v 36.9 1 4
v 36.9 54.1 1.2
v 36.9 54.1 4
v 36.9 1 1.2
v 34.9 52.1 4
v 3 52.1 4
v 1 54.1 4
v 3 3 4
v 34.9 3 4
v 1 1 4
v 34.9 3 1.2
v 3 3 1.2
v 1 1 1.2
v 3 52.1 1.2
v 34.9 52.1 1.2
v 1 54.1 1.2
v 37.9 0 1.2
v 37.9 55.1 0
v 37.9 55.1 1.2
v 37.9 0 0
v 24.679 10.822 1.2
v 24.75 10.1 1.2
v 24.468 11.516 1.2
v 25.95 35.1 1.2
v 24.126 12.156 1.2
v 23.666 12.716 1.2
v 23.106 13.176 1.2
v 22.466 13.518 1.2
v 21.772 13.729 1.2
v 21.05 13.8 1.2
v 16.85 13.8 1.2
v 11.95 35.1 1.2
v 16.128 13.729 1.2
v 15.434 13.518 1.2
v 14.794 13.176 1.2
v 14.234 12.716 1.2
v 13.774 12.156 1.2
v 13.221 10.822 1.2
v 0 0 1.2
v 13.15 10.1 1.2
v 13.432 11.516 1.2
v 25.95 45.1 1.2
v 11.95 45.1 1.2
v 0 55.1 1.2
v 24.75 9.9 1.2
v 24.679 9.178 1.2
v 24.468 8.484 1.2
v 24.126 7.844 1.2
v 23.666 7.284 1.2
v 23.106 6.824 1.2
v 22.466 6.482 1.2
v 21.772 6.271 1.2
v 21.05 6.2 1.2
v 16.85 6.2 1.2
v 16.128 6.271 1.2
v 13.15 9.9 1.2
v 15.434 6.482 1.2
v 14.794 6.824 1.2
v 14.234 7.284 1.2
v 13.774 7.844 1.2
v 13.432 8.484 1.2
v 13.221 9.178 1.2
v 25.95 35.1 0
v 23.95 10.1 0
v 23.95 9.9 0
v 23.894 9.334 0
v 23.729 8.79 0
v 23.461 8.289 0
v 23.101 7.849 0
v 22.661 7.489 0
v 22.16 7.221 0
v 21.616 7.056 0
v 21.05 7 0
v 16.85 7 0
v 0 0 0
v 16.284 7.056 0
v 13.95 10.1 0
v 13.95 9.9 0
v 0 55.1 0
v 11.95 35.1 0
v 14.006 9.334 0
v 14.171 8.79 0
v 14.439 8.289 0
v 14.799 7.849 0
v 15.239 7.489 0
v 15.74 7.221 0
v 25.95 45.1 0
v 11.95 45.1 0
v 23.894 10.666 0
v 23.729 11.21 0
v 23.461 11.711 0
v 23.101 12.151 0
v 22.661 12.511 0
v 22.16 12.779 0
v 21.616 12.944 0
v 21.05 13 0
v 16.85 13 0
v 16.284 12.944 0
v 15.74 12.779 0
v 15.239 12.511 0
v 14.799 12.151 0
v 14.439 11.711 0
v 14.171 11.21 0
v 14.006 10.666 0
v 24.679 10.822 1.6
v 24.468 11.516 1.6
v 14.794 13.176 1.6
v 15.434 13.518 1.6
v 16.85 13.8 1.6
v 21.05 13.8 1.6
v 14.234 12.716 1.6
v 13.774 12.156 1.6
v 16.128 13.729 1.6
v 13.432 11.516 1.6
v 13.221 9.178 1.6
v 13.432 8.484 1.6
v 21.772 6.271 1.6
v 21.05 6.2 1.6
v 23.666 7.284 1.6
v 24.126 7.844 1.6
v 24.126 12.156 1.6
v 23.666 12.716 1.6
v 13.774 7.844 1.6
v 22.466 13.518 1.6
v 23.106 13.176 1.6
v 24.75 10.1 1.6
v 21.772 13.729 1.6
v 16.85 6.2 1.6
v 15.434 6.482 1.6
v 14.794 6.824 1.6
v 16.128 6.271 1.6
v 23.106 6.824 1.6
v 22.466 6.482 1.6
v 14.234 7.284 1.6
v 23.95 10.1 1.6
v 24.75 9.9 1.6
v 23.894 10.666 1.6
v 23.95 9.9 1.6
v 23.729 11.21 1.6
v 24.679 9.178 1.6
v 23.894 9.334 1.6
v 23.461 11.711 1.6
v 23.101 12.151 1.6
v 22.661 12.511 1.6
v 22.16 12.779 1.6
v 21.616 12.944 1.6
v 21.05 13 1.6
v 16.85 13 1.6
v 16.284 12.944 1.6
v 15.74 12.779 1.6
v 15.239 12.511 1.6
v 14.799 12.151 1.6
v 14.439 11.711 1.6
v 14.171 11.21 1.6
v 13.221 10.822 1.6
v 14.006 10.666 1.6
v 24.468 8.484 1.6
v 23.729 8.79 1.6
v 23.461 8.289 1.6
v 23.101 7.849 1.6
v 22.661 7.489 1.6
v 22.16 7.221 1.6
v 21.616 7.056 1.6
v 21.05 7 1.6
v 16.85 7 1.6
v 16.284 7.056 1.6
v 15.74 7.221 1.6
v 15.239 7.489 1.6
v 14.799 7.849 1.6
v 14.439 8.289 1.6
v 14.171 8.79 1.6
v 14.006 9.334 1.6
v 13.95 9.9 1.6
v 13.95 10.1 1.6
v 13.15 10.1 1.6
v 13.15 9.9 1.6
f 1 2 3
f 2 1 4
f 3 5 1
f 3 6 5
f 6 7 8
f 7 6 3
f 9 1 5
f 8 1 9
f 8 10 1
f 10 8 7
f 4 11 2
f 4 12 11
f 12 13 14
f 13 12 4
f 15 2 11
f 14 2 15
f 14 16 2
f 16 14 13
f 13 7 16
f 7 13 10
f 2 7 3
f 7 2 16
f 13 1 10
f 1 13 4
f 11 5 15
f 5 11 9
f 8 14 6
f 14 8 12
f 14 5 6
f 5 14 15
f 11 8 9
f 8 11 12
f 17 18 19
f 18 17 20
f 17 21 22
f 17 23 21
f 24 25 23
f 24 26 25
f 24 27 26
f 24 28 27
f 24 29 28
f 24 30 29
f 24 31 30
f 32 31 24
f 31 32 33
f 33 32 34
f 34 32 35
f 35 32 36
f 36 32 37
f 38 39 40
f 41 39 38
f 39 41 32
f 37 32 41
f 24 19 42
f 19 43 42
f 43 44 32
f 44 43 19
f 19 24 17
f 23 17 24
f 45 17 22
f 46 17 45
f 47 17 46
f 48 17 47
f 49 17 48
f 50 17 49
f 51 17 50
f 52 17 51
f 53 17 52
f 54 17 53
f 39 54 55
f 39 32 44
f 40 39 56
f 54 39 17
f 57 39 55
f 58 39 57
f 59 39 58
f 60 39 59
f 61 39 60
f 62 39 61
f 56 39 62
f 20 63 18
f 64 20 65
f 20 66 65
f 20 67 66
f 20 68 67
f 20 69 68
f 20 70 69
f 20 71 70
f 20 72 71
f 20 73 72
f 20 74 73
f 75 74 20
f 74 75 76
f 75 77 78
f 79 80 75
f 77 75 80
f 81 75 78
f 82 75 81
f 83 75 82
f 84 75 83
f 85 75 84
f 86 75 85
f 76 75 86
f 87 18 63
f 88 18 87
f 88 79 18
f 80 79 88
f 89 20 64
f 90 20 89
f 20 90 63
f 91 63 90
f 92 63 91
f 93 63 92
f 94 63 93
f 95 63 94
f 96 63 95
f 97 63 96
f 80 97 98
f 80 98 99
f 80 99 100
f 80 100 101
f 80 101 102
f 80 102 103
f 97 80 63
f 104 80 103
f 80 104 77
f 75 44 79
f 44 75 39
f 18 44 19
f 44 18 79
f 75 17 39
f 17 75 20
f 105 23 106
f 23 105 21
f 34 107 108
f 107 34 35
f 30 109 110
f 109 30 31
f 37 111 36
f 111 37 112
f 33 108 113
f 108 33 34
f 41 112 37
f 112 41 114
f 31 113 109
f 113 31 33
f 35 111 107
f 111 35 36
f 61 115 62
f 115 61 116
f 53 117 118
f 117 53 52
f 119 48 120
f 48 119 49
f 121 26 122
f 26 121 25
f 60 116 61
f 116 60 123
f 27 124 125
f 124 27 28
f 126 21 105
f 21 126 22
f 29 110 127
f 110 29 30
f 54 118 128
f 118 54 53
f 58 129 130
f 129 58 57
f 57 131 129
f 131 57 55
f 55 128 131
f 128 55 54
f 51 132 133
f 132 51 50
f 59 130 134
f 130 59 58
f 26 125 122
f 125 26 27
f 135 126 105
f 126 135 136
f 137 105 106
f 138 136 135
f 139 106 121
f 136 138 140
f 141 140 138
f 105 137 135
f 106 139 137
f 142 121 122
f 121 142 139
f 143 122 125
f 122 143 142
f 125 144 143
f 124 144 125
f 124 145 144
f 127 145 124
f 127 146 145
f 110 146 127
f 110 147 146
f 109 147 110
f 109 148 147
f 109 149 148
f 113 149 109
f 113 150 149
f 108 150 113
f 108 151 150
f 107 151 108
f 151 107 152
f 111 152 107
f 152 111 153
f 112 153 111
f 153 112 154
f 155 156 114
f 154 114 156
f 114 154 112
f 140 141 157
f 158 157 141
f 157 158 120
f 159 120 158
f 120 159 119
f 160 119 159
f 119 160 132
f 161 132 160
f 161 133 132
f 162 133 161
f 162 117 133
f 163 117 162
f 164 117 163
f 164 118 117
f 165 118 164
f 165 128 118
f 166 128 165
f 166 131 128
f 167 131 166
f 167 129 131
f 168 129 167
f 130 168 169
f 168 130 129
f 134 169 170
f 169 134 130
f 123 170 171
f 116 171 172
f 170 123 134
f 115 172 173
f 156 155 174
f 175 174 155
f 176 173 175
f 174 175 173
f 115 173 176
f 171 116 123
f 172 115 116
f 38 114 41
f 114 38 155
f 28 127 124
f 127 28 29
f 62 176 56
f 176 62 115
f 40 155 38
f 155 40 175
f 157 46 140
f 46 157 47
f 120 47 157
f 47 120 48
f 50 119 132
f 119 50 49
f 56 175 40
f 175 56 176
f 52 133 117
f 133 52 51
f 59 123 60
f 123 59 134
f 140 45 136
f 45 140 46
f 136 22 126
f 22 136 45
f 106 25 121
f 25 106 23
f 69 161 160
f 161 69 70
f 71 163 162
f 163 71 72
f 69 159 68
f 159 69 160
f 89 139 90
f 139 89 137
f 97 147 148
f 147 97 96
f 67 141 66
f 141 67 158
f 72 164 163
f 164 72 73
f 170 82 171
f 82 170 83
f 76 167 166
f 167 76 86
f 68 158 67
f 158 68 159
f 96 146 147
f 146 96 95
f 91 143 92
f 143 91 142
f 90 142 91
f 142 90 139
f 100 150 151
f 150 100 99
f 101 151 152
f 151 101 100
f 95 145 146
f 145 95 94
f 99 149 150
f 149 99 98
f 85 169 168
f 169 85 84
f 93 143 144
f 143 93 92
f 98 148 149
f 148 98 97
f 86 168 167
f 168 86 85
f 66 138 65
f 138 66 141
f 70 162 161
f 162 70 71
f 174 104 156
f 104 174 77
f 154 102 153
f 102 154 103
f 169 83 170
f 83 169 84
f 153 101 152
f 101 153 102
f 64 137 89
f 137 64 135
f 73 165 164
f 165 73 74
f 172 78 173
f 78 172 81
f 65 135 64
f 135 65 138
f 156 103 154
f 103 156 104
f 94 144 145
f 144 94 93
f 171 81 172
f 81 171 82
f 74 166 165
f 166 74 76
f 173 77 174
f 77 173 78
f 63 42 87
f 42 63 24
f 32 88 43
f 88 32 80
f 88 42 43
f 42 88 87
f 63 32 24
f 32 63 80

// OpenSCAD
outer_x = 37.9;
outer_y = 55.1;
inner_x = 36.3;
inner_y = 53.5;
base_wall = 0.8;
base_thickness = 1.2;
lid_total_h = 4.0;
plug_wall_thickness = 2.0;
tolerance = 0.2;
usb_w = 9.8 + tolerance;
usb_h = 5.8 + tolerance;
usb_r = 2.9;
usb_offset_y = 10.0;
usb_ring_h = 0.4;
hole_w = 14.0;
hole_h = 10.0;
hole_offset_y = 10.0;
eps = 0.01;
include_sensor_hole = true;

module usb_shape(extra_r = 0, height = base_thickness) {
    hull() {
        for (i = [-1, 1], j = [-1, 1]) {
            translate([
                i * (usb_w / 2 - usb_r), 
                j * (usb_h / 2 - usb_r), 
                0
            ])
            cylinder(h = height, r = usb_r + extra_r, center = false, $fn = 32);
        }
    }
}

module lid_base() {
    cube([outer_x, outer_y, base_thickness]);
}

module lid_frame() {
    translate([base_wall + tolerance, base_wall + tolerance, base_thickness])
        difference() {
            cube([
                inner_x - 2 * tolerance, 
                inner_y - 2 * tolerance, 
                lid_total_h - base_thickness
            ]);
            translate([plug_wall_thickness, plug_wall_thickness, -eps])
                cube([
                    inner_x - 2 * tolerance - 2 * plug_wall_thickness, 
                    inner_y - 2 * tolerance - 2 * plug_wall_thickness, 
                    lid_total_h - base_thickness + 2 * eps
                ]);
        }
}

module usb_reinforcement() {
    translate([outer_x / 2, usb_offset_y, base_thickness - eps])
        usb_shape(base_wall, usb_ring_h + eps);
}

module sensor_hole() {
    translate([(outer_x - hole_w) / 2, outer_y - hole_offset_y - hole_h, -eps])
        cube([hole_w, hole_h, base_thickness + 2 * eps]);
}

module lid_subtractions() {
    translate([outer_x / 2, usb_offset_y, -eps])
        usb_shape(0, base_thickness + usb_ring_h + 2 * eps);
    if (include_sensor_hole) { sensor_hole(); }
    
}

module lid_additions() {
    lid_base();
    lid_frame();
    usb_reinforcement();
}

module lid_assembly() {
    difference() {
        lid_additions();
        lid_subtractions();
    }
}

lid_assembly();
